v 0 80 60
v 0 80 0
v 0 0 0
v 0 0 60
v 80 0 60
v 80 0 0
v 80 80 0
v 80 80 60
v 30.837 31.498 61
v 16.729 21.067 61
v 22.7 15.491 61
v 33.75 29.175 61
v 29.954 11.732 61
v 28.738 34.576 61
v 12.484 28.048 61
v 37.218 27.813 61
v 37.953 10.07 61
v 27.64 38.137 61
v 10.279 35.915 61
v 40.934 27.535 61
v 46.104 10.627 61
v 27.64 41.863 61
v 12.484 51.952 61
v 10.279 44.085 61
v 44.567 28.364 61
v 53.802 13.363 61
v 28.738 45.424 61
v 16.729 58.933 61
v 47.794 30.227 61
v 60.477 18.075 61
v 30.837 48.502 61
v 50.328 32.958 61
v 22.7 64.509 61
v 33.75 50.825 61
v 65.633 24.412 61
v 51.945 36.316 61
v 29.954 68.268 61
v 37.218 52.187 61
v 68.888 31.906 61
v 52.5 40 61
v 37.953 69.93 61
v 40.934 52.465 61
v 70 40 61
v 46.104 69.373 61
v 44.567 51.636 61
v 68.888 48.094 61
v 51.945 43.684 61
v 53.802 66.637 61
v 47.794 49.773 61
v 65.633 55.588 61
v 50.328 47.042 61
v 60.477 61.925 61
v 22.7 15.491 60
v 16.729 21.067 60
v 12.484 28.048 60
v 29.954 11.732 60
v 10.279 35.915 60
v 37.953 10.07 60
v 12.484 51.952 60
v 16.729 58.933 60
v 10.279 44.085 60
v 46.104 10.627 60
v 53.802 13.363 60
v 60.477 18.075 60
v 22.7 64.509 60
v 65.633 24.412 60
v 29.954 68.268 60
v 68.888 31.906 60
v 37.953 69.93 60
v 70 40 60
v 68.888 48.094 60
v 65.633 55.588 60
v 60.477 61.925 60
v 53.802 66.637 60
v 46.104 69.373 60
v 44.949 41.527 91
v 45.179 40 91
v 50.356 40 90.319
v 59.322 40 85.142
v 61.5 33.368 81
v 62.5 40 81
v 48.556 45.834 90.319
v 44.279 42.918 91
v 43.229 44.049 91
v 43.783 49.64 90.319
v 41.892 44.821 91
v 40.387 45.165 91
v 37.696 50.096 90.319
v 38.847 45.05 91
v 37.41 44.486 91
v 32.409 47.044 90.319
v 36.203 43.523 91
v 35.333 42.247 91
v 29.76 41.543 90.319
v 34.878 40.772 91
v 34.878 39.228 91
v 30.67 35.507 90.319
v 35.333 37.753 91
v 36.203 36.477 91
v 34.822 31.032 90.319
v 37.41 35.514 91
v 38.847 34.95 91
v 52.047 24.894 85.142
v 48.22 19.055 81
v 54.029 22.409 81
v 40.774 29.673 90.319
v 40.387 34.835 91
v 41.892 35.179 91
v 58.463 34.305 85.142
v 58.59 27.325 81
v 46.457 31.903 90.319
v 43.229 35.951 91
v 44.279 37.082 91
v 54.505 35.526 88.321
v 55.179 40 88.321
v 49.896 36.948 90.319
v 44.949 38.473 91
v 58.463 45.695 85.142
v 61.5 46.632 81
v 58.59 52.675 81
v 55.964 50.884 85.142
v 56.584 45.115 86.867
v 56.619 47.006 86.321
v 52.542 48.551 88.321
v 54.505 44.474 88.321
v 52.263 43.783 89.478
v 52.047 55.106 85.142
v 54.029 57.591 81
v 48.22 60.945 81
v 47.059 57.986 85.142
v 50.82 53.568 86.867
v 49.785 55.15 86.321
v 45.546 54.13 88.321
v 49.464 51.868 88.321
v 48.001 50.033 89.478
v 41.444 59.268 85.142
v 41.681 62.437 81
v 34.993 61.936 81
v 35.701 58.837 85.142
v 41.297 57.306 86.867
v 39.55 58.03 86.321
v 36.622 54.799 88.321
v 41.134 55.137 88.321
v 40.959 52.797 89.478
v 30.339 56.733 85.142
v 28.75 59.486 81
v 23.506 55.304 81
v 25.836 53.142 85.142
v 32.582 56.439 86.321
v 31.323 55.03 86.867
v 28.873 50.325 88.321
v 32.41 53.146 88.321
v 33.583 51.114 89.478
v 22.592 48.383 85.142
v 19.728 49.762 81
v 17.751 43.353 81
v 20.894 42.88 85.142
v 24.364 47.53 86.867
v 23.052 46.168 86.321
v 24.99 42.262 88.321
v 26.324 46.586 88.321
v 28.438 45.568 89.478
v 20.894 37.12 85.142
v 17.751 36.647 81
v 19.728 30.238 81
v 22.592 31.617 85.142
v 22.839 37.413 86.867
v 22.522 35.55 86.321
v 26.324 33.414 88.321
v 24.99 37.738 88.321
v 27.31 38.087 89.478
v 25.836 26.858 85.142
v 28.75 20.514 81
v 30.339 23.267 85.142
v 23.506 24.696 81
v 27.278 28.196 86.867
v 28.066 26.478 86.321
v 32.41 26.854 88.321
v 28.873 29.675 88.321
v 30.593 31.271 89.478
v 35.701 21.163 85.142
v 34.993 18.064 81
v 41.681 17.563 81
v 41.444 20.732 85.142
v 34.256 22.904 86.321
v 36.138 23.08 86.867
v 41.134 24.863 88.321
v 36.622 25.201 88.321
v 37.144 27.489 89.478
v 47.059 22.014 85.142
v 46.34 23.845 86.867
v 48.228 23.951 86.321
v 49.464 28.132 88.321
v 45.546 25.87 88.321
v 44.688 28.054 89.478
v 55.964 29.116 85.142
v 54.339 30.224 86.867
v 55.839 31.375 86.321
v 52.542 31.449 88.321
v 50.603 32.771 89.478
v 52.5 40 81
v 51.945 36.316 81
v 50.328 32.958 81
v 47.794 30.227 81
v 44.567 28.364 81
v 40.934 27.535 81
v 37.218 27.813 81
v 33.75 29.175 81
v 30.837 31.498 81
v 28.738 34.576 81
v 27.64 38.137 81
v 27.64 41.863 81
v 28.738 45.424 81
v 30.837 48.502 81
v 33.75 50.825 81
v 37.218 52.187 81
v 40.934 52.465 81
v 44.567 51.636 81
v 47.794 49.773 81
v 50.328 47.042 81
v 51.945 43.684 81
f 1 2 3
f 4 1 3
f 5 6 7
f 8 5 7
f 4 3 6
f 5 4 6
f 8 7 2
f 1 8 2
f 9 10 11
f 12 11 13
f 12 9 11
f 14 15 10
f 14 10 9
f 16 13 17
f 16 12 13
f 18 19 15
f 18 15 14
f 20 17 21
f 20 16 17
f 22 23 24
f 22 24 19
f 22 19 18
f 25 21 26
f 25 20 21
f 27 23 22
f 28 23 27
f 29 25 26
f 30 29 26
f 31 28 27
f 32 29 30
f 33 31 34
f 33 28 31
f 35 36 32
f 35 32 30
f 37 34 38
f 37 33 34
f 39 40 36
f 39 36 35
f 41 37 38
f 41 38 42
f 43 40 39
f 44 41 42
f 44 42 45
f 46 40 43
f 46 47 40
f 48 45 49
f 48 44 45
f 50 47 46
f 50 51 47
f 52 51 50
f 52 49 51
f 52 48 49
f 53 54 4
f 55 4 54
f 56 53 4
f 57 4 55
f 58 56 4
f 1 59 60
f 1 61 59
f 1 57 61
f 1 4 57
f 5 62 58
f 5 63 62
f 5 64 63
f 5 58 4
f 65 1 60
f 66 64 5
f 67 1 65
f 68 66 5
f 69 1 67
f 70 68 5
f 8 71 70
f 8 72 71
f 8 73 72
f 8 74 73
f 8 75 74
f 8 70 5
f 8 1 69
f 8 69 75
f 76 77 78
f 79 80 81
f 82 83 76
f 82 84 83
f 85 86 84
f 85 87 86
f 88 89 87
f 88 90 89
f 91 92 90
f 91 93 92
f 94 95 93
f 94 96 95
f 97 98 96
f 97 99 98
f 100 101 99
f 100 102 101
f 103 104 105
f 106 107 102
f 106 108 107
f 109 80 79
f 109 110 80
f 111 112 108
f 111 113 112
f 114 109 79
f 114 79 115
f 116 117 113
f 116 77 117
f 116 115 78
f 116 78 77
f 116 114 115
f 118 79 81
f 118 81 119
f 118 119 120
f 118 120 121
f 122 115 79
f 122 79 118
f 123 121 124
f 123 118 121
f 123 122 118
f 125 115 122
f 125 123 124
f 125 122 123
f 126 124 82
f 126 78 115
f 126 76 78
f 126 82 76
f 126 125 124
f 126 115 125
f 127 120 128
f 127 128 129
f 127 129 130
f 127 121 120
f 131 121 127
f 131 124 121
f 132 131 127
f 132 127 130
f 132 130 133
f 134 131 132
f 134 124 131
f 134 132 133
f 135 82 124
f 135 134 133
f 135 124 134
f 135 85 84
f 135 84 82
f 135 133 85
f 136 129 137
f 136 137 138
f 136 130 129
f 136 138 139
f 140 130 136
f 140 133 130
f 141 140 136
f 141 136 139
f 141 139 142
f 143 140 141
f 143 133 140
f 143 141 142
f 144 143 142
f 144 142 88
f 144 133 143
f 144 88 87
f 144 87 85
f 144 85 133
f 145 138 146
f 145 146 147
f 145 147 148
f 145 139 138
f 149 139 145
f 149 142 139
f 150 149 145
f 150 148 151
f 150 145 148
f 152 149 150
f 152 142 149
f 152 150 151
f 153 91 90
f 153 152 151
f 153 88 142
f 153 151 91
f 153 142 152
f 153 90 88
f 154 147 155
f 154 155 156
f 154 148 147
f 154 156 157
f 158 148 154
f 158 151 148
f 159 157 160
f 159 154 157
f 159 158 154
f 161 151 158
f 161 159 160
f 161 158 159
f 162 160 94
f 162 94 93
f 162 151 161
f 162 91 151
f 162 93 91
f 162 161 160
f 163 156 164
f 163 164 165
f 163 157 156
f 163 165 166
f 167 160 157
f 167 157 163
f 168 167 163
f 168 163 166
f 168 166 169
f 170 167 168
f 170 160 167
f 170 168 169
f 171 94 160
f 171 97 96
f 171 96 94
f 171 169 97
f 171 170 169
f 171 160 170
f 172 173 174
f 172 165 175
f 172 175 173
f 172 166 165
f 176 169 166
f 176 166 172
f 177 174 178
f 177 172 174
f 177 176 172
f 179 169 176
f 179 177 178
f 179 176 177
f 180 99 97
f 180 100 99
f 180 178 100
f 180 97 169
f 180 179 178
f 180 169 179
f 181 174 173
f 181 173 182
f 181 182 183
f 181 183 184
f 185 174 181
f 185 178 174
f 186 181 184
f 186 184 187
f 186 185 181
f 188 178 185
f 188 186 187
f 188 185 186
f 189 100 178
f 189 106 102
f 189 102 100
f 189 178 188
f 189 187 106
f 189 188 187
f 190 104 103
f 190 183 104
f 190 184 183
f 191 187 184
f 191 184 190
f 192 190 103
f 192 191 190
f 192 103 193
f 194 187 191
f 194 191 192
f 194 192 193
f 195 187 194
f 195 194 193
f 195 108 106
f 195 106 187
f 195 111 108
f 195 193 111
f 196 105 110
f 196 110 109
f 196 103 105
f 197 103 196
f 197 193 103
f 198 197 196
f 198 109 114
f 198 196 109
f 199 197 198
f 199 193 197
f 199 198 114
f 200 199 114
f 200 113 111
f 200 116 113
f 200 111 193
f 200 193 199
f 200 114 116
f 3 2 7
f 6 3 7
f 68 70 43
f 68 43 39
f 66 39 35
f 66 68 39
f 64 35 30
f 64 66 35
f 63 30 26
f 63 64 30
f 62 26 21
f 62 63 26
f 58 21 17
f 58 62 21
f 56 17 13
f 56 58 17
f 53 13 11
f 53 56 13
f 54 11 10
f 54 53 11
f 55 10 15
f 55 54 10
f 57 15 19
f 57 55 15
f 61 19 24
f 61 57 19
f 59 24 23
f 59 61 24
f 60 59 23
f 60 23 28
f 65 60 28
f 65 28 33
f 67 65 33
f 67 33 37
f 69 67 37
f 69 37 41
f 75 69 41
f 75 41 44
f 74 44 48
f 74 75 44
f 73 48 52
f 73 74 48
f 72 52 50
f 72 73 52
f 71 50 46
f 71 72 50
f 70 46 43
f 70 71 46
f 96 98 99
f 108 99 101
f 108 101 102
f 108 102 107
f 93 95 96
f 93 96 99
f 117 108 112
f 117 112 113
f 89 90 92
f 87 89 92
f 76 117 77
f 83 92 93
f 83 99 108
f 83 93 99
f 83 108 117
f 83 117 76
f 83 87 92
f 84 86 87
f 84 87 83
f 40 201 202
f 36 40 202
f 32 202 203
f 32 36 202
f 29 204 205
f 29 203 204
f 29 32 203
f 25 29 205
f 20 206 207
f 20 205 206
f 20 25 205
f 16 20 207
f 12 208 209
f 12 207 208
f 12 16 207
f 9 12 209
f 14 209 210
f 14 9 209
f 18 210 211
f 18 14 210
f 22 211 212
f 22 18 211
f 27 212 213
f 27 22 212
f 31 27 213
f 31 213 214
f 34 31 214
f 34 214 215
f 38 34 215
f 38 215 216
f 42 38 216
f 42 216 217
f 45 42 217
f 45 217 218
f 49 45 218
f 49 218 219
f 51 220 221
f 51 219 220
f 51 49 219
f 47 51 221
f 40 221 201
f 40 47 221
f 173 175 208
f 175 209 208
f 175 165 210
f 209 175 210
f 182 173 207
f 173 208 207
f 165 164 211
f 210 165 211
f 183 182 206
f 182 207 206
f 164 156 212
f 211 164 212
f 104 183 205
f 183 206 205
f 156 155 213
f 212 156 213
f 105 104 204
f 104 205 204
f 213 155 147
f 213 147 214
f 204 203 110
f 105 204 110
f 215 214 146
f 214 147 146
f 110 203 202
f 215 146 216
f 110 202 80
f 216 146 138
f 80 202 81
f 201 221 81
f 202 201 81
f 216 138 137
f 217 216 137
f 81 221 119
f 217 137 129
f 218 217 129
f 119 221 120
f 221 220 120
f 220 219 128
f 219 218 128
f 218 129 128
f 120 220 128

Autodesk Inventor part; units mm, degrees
ref_plane "YZ Plane" through (0, 0, 0) normal (1, 0, 0) x (0, 1, 0)
ref_plane "XZ Plane" through (0, 0, 0) normal (0, 1, 0) x (-1, 0, 0)
ref_plane "XY Plane" through (0, 0, 0) normal (0, 0, 1) x (1, 0, 0)
sketch "Sketch1" plane through (0, 0, 0) normal (0, 0, 1) x (1, 0, 0)
  line L0 (0, 0) -> (80, 0)
  line L1 (80, 0) -> (80, 80)
  line L2 (80, 80) -> (0, 80)
  line L3 (0, 80) -> (0, 0)
  dimension "d0" = 80
  dimension "d1" = 80
extrude "Extrusion1" add sketch "Sketch1" along normal blind 60
sketch "Sketch2" plane through (0, 0, 60) normal (0, 0, 1) x (1, 0, 0)
  circle A0 centre (40, 40) radius 30
  line L0 (0, 80) -> (0, 0) projected
  line L1 (80, 80) -> (0, 80) projected
  dimension "d4" = 40
  dimension "d5" = 40
  dimension "d6" = 60
extrude "Extrusion2" add sketch "Sketch2" along normal blind 1
sketch "Sketch3" plane through (40, 40, 61) normal (0, 0, 1) x (1, 0, 0)
  circle A0 centre (0, 0) radius 12.5
  point P0 (-40, -40)
  dimension "d9" = 25
extrude "Extrusion3" add sketch "Sketch3" along normal blind 20
sketch "Sketch4" plane through (40, 40, 81) normal (0, 0, 1) x (1, 0, 0)
  circle A0 centre (0, 0) radius 22.5
  point P0 (-40, -40)
  dimension "d12" = 45
extrude "Extrusion4" add sketch "Sketch4" along normal blind 10
fillet "Fillet1" radius 20 1 edges at (17.5, 40, 91)
properties part number "emergencyStop"
